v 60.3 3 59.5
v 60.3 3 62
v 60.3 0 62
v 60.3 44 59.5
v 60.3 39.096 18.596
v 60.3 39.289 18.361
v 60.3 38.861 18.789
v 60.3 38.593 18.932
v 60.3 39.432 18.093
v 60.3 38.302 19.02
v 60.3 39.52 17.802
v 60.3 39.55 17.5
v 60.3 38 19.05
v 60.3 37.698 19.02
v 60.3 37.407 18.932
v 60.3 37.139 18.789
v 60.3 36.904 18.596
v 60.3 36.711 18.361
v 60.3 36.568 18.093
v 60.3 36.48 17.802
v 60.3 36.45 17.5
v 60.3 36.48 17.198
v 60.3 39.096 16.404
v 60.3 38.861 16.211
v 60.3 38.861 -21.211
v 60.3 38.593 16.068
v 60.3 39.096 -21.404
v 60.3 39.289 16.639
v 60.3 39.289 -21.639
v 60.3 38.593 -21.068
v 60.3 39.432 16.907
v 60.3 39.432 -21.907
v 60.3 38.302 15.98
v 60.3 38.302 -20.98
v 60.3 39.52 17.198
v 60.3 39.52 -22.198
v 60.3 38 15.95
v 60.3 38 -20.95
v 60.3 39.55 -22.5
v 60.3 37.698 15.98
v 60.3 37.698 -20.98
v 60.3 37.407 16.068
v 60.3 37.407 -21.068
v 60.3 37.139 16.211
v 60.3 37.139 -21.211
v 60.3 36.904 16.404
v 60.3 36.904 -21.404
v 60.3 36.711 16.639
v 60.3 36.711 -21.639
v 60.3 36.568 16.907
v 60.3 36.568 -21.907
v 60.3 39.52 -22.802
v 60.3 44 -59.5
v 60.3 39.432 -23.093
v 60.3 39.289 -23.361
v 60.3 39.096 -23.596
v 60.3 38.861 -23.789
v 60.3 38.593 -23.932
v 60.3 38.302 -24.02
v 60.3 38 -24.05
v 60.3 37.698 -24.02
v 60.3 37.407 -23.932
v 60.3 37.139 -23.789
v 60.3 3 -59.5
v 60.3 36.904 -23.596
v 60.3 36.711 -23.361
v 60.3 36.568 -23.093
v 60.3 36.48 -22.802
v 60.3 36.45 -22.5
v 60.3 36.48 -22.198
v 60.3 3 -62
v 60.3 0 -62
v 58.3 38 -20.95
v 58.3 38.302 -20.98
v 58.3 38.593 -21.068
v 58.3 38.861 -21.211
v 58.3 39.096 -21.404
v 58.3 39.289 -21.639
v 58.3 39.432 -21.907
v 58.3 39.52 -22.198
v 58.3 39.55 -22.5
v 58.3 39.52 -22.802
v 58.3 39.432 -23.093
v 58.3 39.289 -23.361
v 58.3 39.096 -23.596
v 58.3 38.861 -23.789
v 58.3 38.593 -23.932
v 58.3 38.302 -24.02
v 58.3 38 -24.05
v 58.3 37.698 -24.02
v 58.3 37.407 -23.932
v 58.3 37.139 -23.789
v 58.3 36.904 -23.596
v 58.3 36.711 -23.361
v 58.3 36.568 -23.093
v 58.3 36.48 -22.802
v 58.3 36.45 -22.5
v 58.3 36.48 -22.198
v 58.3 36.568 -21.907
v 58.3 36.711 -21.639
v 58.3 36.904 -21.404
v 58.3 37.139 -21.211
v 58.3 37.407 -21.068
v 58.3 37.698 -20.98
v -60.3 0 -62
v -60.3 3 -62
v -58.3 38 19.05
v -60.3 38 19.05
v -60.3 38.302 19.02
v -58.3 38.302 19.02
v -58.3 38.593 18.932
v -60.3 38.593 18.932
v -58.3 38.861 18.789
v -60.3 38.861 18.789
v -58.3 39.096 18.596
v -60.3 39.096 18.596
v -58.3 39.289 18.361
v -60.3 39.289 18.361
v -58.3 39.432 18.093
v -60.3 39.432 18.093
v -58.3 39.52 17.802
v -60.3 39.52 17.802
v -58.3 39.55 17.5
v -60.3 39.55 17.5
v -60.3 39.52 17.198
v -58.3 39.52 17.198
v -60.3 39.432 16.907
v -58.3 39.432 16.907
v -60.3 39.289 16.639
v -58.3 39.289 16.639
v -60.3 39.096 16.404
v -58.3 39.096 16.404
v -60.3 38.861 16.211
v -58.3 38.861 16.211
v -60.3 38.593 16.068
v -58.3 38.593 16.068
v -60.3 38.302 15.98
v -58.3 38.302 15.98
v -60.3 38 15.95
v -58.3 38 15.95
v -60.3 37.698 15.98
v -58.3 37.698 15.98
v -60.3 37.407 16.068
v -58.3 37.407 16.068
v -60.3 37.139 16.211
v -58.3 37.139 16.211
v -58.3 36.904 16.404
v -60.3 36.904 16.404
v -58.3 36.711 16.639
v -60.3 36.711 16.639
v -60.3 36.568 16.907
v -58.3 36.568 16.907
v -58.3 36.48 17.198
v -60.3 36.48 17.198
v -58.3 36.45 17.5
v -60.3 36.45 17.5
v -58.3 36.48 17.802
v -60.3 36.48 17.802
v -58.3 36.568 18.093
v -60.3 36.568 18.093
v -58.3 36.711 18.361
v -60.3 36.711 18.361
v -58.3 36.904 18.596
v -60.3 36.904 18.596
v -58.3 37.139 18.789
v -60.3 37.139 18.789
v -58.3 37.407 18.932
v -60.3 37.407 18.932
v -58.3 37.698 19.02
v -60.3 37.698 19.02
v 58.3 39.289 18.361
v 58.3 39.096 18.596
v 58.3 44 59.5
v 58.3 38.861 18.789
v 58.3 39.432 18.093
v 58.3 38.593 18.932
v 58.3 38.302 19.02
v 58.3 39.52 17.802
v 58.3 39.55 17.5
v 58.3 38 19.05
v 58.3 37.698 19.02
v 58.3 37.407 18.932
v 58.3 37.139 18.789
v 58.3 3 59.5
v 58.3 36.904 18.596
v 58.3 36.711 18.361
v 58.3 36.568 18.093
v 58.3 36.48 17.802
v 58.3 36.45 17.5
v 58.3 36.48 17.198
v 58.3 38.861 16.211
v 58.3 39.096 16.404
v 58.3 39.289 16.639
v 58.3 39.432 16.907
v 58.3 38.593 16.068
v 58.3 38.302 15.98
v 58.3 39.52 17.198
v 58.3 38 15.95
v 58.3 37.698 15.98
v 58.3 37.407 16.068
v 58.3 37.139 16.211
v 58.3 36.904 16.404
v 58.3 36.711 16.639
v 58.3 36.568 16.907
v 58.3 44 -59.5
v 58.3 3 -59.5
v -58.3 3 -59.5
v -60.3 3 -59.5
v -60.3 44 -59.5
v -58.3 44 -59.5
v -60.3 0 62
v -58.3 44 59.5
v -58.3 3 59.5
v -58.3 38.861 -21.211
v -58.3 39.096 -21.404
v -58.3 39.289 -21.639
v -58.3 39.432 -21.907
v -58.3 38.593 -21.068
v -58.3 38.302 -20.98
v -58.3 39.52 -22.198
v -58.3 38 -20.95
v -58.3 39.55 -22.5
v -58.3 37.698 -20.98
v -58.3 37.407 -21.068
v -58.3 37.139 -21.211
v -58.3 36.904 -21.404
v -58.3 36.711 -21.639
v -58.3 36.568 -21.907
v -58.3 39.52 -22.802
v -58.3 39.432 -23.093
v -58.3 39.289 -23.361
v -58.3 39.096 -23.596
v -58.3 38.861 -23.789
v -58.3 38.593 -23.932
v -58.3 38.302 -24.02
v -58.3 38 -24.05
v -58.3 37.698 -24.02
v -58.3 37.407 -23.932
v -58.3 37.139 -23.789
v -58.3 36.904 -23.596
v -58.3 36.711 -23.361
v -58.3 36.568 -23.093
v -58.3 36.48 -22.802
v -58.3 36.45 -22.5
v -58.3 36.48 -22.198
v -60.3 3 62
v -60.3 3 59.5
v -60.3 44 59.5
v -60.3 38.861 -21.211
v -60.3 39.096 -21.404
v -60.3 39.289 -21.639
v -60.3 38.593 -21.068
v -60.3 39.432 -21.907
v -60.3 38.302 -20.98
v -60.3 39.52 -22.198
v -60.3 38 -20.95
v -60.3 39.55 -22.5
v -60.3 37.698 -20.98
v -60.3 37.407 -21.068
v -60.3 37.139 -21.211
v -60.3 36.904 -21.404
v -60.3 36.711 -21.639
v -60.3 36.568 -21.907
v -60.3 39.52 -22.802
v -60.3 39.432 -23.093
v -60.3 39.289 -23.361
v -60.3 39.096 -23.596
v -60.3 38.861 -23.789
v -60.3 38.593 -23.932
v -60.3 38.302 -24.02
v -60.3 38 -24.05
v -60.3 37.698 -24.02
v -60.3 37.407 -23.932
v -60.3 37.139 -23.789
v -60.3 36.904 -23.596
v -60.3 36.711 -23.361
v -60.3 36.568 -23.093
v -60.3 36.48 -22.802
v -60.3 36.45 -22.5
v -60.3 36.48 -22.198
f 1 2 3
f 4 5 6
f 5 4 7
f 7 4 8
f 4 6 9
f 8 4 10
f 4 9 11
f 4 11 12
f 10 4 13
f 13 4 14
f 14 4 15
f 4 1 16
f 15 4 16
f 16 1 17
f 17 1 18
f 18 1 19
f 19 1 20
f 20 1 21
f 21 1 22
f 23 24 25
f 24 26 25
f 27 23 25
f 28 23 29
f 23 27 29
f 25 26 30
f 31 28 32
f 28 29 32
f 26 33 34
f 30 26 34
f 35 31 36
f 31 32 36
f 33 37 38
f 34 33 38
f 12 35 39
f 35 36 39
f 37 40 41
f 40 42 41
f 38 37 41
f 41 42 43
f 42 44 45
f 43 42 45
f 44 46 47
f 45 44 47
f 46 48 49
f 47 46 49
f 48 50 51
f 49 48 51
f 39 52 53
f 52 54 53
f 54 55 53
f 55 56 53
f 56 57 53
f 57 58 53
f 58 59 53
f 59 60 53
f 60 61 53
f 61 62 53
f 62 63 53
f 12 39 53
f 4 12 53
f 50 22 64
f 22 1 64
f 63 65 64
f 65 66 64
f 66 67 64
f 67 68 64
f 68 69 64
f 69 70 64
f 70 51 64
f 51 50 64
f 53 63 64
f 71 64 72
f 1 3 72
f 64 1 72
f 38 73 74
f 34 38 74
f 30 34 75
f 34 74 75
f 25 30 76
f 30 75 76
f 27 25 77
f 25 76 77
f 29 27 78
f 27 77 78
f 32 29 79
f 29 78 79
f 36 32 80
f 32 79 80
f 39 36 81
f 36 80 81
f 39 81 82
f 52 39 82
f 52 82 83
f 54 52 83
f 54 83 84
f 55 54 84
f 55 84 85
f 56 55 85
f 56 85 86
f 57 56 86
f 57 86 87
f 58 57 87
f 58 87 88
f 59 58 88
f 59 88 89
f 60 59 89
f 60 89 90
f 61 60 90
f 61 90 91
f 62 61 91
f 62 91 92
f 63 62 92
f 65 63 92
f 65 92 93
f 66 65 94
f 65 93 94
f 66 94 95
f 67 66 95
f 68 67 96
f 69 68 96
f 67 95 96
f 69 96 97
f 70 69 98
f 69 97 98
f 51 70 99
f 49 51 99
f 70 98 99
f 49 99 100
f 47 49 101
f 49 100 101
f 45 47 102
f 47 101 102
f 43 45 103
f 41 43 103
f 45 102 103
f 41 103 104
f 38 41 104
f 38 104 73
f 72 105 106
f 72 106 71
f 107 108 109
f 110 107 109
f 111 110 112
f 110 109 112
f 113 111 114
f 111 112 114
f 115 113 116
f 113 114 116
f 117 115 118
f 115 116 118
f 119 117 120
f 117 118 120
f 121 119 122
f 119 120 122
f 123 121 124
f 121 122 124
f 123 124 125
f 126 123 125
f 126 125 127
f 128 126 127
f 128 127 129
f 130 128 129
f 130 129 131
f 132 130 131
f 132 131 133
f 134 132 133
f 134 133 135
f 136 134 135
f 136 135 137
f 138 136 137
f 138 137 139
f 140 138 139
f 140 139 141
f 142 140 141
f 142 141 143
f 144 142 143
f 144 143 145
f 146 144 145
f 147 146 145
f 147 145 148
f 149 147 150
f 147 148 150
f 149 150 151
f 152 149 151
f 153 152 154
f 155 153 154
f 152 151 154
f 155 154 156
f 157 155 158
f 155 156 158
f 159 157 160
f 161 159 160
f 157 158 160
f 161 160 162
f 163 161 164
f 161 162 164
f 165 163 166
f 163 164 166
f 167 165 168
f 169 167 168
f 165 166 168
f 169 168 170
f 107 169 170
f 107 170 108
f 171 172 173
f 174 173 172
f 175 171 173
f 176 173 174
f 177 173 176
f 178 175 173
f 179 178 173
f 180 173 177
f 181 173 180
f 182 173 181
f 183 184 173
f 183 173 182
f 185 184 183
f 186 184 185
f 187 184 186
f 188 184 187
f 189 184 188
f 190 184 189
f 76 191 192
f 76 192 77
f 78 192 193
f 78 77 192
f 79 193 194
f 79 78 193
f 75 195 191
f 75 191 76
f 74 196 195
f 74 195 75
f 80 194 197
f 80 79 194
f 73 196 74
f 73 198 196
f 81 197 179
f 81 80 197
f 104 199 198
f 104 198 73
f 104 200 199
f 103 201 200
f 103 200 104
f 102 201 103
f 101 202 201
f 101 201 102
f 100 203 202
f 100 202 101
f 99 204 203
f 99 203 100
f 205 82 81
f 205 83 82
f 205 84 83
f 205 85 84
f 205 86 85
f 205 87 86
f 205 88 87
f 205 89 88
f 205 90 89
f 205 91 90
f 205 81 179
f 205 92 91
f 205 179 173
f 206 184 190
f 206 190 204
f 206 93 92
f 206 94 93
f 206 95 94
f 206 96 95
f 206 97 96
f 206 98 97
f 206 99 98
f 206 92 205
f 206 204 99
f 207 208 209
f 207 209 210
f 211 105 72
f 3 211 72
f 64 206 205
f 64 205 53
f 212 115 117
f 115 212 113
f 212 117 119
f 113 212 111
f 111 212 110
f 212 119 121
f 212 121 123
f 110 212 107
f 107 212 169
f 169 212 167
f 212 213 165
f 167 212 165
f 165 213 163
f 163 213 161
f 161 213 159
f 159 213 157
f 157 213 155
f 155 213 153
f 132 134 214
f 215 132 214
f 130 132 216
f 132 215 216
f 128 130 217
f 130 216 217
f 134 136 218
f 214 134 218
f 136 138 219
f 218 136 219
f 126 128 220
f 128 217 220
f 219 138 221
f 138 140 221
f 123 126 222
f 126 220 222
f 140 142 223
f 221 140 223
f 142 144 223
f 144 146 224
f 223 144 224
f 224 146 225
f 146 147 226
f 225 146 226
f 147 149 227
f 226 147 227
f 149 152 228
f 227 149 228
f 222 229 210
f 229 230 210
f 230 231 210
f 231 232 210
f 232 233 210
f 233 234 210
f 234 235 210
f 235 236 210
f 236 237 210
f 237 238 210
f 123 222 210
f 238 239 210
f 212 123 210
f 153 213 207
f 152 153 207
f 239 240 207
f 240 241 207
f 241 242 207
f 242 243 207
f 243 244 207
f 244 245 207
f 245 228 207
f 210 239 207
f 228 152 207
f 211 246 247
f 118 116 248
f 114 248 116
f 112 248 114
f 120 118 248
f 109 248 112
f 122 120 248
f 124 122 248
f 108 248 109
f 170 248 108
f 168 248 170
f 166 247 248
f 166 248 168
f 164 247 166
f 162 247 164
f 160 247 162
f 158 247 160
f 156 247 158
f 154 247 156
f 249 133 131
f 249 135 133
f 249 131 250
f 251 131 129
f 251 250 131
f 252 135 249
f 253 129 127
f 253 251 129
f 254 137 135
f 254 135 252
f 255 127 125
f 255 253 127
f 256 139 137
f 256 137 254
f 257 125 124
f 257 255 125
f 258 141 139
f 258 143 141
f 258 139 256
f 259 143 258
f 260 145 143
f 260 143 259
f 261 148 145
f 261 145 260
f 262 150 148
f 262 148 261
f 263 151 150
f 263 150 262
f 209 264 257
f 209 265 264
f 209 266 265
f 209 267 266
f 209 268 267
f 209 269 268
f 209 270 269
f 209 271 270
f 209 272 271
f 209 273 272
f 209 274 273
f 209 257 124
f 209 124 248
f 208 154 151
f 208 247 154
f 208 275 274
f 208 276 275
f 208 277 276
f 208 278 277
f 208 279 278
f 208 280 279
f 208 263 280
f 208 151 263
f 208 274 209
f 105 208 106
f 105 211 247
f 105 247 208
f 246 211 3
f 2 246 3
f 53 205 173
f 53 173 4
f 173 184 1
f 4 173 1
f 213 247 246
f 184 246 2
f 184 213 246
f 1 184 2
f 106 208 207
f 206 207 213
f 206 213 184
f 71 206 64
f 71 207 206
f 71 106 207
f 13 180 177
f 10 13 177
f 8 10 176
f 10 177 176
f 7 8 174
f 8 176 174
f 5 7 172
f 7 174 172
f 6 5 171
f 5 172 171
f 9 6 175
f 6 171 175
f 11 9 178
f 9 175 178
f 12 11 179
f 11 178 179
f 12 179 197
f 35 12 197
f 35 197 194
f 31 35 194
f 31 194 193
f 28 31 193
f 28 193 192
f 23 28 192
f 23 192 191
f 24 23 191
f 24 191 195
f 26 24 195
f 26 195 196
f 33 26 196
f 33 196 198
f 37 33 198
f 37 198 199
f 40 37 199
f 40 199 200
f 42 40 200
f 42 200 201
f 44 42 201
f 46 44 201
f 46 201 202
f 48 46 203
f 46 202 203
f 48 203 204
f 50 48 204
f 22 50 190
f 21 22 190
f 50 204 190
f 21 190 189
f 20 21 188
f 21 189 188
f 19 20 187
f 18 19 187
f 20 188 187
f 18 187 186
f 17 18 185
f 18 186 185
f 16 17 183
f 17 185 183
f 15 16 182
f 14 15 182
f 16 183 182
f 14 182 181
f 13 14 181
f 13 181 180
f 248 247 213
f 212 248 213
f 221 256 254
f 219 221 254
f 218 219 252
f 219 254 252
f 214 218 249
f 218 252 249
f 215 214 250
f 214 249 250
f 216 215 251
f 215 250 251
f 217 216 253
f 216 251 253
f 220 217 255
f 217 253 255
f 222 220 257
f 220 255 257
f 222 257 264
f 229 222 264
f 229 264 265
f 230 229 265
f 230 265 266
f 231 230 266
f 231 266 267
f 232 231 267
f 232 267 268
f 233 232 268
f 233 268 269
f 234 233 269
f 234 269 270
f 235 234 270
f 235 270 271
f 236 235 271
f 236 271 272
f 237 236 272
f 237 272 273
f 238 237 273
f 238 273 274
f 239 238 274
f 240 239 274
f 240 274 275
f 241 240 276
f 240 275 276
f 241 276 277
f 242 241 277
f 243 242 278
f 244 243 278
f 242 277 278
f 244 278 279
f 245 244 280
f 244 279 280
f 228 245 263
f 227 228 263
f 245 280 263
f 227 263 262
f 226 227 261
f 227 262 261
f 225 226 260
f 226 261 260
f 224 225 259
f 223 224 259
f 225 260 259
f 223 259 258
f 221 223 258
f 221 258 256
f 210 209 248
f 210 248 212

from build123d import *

# Parameters (mm, degrees)
SKETCH3_W           = 120.6
SKETCH3_H           = 124
BOSS_EXTRUDE3_DEPTH = 44
SKETCH9_W           = 116.6
SKETCH9_H           = 124
CUT_EXTRUDE2_DEPTH  = 42
SKETCH10_W          = 120.6
SKETCH10_H          = 2.5
CUT_EXTRUDE3_DEPTH  = 42
SKETCH11_W          = 120.6
SKETCH11_H          = 2.5
CUT_EXTRUDE4_DEPTH  = 42
SKETCH12_R          = 1.55
CUT_EXTRUDE5_DEPTH  = 124.6


with BuildPart() as part:
    # Sketch3 → Boss-Extrude3 (new body)
    with BuildSketch(Plane(origin=(0, 0, 0), x_dir=(1, 0, 0), z_dir=(0, 1, 0))):
        Rectangle(SKETCH3_W, SKETCH3_H)
    extrude(amount=BOSS_EXTRUDE3_DEPTH)

    # Sketch9 → Cut-Extrude2 (cut, through all)
    with BuildSketch(Plane(origin=(0, 3, 0), x_dir=(1, 0, 0), z_dir=(0, 1, 0))):
        Rectangle(SKETCH9_W, SKETCH9_H)
    extrude(amount=CUT_EXTRUDE2_DEPTH, mode=Mode.SUBTRACT)

    # Sketch10 → Cut-Extrude3 (cut, through all)
    with BuildSketch(Plane(origin=(0, 3, 0), x_dir=(1, 0, 0), z_dir=(0, 1, 0))):
        with Locations((0, 60.75)):
            Rectangle(SKETCH10_W, SKETCH10_H)
    extrude(amount=CUT_EXTRUDE3_DEPTH, mode=Mode.SUBTRACT)

    # Sketch11 → Cut-Extrude4 (cut, through all)
    with BuildSketch(Plane(origin=(0, 3, 0), x_dir=(1, 0, 0), z_dir=(0, 1, 0))):
        with Locations((0, -60.75)):
            Rectangle(SKETCH11_W, SKETCH11_H)
    extrude(amount=CUT_EXTRUDE4_DEPTH, mode=Mode.SUBTRACT)

    # Sketch12 → Cut-Extrude5 (cut, through all)
    with BuildSketch(Plane.ZY.offset(63.3)):
        with Locations((-22.5, 38)):
            Circle(SKETCH12_R)
        with Locations((17.5, 38)):
            Circle(SKETCH12_R)
    extrude(amount=-CUT_EXTRUDE5_DEPTH, mode=Mode.SUBTRACT)


solid = part.part
